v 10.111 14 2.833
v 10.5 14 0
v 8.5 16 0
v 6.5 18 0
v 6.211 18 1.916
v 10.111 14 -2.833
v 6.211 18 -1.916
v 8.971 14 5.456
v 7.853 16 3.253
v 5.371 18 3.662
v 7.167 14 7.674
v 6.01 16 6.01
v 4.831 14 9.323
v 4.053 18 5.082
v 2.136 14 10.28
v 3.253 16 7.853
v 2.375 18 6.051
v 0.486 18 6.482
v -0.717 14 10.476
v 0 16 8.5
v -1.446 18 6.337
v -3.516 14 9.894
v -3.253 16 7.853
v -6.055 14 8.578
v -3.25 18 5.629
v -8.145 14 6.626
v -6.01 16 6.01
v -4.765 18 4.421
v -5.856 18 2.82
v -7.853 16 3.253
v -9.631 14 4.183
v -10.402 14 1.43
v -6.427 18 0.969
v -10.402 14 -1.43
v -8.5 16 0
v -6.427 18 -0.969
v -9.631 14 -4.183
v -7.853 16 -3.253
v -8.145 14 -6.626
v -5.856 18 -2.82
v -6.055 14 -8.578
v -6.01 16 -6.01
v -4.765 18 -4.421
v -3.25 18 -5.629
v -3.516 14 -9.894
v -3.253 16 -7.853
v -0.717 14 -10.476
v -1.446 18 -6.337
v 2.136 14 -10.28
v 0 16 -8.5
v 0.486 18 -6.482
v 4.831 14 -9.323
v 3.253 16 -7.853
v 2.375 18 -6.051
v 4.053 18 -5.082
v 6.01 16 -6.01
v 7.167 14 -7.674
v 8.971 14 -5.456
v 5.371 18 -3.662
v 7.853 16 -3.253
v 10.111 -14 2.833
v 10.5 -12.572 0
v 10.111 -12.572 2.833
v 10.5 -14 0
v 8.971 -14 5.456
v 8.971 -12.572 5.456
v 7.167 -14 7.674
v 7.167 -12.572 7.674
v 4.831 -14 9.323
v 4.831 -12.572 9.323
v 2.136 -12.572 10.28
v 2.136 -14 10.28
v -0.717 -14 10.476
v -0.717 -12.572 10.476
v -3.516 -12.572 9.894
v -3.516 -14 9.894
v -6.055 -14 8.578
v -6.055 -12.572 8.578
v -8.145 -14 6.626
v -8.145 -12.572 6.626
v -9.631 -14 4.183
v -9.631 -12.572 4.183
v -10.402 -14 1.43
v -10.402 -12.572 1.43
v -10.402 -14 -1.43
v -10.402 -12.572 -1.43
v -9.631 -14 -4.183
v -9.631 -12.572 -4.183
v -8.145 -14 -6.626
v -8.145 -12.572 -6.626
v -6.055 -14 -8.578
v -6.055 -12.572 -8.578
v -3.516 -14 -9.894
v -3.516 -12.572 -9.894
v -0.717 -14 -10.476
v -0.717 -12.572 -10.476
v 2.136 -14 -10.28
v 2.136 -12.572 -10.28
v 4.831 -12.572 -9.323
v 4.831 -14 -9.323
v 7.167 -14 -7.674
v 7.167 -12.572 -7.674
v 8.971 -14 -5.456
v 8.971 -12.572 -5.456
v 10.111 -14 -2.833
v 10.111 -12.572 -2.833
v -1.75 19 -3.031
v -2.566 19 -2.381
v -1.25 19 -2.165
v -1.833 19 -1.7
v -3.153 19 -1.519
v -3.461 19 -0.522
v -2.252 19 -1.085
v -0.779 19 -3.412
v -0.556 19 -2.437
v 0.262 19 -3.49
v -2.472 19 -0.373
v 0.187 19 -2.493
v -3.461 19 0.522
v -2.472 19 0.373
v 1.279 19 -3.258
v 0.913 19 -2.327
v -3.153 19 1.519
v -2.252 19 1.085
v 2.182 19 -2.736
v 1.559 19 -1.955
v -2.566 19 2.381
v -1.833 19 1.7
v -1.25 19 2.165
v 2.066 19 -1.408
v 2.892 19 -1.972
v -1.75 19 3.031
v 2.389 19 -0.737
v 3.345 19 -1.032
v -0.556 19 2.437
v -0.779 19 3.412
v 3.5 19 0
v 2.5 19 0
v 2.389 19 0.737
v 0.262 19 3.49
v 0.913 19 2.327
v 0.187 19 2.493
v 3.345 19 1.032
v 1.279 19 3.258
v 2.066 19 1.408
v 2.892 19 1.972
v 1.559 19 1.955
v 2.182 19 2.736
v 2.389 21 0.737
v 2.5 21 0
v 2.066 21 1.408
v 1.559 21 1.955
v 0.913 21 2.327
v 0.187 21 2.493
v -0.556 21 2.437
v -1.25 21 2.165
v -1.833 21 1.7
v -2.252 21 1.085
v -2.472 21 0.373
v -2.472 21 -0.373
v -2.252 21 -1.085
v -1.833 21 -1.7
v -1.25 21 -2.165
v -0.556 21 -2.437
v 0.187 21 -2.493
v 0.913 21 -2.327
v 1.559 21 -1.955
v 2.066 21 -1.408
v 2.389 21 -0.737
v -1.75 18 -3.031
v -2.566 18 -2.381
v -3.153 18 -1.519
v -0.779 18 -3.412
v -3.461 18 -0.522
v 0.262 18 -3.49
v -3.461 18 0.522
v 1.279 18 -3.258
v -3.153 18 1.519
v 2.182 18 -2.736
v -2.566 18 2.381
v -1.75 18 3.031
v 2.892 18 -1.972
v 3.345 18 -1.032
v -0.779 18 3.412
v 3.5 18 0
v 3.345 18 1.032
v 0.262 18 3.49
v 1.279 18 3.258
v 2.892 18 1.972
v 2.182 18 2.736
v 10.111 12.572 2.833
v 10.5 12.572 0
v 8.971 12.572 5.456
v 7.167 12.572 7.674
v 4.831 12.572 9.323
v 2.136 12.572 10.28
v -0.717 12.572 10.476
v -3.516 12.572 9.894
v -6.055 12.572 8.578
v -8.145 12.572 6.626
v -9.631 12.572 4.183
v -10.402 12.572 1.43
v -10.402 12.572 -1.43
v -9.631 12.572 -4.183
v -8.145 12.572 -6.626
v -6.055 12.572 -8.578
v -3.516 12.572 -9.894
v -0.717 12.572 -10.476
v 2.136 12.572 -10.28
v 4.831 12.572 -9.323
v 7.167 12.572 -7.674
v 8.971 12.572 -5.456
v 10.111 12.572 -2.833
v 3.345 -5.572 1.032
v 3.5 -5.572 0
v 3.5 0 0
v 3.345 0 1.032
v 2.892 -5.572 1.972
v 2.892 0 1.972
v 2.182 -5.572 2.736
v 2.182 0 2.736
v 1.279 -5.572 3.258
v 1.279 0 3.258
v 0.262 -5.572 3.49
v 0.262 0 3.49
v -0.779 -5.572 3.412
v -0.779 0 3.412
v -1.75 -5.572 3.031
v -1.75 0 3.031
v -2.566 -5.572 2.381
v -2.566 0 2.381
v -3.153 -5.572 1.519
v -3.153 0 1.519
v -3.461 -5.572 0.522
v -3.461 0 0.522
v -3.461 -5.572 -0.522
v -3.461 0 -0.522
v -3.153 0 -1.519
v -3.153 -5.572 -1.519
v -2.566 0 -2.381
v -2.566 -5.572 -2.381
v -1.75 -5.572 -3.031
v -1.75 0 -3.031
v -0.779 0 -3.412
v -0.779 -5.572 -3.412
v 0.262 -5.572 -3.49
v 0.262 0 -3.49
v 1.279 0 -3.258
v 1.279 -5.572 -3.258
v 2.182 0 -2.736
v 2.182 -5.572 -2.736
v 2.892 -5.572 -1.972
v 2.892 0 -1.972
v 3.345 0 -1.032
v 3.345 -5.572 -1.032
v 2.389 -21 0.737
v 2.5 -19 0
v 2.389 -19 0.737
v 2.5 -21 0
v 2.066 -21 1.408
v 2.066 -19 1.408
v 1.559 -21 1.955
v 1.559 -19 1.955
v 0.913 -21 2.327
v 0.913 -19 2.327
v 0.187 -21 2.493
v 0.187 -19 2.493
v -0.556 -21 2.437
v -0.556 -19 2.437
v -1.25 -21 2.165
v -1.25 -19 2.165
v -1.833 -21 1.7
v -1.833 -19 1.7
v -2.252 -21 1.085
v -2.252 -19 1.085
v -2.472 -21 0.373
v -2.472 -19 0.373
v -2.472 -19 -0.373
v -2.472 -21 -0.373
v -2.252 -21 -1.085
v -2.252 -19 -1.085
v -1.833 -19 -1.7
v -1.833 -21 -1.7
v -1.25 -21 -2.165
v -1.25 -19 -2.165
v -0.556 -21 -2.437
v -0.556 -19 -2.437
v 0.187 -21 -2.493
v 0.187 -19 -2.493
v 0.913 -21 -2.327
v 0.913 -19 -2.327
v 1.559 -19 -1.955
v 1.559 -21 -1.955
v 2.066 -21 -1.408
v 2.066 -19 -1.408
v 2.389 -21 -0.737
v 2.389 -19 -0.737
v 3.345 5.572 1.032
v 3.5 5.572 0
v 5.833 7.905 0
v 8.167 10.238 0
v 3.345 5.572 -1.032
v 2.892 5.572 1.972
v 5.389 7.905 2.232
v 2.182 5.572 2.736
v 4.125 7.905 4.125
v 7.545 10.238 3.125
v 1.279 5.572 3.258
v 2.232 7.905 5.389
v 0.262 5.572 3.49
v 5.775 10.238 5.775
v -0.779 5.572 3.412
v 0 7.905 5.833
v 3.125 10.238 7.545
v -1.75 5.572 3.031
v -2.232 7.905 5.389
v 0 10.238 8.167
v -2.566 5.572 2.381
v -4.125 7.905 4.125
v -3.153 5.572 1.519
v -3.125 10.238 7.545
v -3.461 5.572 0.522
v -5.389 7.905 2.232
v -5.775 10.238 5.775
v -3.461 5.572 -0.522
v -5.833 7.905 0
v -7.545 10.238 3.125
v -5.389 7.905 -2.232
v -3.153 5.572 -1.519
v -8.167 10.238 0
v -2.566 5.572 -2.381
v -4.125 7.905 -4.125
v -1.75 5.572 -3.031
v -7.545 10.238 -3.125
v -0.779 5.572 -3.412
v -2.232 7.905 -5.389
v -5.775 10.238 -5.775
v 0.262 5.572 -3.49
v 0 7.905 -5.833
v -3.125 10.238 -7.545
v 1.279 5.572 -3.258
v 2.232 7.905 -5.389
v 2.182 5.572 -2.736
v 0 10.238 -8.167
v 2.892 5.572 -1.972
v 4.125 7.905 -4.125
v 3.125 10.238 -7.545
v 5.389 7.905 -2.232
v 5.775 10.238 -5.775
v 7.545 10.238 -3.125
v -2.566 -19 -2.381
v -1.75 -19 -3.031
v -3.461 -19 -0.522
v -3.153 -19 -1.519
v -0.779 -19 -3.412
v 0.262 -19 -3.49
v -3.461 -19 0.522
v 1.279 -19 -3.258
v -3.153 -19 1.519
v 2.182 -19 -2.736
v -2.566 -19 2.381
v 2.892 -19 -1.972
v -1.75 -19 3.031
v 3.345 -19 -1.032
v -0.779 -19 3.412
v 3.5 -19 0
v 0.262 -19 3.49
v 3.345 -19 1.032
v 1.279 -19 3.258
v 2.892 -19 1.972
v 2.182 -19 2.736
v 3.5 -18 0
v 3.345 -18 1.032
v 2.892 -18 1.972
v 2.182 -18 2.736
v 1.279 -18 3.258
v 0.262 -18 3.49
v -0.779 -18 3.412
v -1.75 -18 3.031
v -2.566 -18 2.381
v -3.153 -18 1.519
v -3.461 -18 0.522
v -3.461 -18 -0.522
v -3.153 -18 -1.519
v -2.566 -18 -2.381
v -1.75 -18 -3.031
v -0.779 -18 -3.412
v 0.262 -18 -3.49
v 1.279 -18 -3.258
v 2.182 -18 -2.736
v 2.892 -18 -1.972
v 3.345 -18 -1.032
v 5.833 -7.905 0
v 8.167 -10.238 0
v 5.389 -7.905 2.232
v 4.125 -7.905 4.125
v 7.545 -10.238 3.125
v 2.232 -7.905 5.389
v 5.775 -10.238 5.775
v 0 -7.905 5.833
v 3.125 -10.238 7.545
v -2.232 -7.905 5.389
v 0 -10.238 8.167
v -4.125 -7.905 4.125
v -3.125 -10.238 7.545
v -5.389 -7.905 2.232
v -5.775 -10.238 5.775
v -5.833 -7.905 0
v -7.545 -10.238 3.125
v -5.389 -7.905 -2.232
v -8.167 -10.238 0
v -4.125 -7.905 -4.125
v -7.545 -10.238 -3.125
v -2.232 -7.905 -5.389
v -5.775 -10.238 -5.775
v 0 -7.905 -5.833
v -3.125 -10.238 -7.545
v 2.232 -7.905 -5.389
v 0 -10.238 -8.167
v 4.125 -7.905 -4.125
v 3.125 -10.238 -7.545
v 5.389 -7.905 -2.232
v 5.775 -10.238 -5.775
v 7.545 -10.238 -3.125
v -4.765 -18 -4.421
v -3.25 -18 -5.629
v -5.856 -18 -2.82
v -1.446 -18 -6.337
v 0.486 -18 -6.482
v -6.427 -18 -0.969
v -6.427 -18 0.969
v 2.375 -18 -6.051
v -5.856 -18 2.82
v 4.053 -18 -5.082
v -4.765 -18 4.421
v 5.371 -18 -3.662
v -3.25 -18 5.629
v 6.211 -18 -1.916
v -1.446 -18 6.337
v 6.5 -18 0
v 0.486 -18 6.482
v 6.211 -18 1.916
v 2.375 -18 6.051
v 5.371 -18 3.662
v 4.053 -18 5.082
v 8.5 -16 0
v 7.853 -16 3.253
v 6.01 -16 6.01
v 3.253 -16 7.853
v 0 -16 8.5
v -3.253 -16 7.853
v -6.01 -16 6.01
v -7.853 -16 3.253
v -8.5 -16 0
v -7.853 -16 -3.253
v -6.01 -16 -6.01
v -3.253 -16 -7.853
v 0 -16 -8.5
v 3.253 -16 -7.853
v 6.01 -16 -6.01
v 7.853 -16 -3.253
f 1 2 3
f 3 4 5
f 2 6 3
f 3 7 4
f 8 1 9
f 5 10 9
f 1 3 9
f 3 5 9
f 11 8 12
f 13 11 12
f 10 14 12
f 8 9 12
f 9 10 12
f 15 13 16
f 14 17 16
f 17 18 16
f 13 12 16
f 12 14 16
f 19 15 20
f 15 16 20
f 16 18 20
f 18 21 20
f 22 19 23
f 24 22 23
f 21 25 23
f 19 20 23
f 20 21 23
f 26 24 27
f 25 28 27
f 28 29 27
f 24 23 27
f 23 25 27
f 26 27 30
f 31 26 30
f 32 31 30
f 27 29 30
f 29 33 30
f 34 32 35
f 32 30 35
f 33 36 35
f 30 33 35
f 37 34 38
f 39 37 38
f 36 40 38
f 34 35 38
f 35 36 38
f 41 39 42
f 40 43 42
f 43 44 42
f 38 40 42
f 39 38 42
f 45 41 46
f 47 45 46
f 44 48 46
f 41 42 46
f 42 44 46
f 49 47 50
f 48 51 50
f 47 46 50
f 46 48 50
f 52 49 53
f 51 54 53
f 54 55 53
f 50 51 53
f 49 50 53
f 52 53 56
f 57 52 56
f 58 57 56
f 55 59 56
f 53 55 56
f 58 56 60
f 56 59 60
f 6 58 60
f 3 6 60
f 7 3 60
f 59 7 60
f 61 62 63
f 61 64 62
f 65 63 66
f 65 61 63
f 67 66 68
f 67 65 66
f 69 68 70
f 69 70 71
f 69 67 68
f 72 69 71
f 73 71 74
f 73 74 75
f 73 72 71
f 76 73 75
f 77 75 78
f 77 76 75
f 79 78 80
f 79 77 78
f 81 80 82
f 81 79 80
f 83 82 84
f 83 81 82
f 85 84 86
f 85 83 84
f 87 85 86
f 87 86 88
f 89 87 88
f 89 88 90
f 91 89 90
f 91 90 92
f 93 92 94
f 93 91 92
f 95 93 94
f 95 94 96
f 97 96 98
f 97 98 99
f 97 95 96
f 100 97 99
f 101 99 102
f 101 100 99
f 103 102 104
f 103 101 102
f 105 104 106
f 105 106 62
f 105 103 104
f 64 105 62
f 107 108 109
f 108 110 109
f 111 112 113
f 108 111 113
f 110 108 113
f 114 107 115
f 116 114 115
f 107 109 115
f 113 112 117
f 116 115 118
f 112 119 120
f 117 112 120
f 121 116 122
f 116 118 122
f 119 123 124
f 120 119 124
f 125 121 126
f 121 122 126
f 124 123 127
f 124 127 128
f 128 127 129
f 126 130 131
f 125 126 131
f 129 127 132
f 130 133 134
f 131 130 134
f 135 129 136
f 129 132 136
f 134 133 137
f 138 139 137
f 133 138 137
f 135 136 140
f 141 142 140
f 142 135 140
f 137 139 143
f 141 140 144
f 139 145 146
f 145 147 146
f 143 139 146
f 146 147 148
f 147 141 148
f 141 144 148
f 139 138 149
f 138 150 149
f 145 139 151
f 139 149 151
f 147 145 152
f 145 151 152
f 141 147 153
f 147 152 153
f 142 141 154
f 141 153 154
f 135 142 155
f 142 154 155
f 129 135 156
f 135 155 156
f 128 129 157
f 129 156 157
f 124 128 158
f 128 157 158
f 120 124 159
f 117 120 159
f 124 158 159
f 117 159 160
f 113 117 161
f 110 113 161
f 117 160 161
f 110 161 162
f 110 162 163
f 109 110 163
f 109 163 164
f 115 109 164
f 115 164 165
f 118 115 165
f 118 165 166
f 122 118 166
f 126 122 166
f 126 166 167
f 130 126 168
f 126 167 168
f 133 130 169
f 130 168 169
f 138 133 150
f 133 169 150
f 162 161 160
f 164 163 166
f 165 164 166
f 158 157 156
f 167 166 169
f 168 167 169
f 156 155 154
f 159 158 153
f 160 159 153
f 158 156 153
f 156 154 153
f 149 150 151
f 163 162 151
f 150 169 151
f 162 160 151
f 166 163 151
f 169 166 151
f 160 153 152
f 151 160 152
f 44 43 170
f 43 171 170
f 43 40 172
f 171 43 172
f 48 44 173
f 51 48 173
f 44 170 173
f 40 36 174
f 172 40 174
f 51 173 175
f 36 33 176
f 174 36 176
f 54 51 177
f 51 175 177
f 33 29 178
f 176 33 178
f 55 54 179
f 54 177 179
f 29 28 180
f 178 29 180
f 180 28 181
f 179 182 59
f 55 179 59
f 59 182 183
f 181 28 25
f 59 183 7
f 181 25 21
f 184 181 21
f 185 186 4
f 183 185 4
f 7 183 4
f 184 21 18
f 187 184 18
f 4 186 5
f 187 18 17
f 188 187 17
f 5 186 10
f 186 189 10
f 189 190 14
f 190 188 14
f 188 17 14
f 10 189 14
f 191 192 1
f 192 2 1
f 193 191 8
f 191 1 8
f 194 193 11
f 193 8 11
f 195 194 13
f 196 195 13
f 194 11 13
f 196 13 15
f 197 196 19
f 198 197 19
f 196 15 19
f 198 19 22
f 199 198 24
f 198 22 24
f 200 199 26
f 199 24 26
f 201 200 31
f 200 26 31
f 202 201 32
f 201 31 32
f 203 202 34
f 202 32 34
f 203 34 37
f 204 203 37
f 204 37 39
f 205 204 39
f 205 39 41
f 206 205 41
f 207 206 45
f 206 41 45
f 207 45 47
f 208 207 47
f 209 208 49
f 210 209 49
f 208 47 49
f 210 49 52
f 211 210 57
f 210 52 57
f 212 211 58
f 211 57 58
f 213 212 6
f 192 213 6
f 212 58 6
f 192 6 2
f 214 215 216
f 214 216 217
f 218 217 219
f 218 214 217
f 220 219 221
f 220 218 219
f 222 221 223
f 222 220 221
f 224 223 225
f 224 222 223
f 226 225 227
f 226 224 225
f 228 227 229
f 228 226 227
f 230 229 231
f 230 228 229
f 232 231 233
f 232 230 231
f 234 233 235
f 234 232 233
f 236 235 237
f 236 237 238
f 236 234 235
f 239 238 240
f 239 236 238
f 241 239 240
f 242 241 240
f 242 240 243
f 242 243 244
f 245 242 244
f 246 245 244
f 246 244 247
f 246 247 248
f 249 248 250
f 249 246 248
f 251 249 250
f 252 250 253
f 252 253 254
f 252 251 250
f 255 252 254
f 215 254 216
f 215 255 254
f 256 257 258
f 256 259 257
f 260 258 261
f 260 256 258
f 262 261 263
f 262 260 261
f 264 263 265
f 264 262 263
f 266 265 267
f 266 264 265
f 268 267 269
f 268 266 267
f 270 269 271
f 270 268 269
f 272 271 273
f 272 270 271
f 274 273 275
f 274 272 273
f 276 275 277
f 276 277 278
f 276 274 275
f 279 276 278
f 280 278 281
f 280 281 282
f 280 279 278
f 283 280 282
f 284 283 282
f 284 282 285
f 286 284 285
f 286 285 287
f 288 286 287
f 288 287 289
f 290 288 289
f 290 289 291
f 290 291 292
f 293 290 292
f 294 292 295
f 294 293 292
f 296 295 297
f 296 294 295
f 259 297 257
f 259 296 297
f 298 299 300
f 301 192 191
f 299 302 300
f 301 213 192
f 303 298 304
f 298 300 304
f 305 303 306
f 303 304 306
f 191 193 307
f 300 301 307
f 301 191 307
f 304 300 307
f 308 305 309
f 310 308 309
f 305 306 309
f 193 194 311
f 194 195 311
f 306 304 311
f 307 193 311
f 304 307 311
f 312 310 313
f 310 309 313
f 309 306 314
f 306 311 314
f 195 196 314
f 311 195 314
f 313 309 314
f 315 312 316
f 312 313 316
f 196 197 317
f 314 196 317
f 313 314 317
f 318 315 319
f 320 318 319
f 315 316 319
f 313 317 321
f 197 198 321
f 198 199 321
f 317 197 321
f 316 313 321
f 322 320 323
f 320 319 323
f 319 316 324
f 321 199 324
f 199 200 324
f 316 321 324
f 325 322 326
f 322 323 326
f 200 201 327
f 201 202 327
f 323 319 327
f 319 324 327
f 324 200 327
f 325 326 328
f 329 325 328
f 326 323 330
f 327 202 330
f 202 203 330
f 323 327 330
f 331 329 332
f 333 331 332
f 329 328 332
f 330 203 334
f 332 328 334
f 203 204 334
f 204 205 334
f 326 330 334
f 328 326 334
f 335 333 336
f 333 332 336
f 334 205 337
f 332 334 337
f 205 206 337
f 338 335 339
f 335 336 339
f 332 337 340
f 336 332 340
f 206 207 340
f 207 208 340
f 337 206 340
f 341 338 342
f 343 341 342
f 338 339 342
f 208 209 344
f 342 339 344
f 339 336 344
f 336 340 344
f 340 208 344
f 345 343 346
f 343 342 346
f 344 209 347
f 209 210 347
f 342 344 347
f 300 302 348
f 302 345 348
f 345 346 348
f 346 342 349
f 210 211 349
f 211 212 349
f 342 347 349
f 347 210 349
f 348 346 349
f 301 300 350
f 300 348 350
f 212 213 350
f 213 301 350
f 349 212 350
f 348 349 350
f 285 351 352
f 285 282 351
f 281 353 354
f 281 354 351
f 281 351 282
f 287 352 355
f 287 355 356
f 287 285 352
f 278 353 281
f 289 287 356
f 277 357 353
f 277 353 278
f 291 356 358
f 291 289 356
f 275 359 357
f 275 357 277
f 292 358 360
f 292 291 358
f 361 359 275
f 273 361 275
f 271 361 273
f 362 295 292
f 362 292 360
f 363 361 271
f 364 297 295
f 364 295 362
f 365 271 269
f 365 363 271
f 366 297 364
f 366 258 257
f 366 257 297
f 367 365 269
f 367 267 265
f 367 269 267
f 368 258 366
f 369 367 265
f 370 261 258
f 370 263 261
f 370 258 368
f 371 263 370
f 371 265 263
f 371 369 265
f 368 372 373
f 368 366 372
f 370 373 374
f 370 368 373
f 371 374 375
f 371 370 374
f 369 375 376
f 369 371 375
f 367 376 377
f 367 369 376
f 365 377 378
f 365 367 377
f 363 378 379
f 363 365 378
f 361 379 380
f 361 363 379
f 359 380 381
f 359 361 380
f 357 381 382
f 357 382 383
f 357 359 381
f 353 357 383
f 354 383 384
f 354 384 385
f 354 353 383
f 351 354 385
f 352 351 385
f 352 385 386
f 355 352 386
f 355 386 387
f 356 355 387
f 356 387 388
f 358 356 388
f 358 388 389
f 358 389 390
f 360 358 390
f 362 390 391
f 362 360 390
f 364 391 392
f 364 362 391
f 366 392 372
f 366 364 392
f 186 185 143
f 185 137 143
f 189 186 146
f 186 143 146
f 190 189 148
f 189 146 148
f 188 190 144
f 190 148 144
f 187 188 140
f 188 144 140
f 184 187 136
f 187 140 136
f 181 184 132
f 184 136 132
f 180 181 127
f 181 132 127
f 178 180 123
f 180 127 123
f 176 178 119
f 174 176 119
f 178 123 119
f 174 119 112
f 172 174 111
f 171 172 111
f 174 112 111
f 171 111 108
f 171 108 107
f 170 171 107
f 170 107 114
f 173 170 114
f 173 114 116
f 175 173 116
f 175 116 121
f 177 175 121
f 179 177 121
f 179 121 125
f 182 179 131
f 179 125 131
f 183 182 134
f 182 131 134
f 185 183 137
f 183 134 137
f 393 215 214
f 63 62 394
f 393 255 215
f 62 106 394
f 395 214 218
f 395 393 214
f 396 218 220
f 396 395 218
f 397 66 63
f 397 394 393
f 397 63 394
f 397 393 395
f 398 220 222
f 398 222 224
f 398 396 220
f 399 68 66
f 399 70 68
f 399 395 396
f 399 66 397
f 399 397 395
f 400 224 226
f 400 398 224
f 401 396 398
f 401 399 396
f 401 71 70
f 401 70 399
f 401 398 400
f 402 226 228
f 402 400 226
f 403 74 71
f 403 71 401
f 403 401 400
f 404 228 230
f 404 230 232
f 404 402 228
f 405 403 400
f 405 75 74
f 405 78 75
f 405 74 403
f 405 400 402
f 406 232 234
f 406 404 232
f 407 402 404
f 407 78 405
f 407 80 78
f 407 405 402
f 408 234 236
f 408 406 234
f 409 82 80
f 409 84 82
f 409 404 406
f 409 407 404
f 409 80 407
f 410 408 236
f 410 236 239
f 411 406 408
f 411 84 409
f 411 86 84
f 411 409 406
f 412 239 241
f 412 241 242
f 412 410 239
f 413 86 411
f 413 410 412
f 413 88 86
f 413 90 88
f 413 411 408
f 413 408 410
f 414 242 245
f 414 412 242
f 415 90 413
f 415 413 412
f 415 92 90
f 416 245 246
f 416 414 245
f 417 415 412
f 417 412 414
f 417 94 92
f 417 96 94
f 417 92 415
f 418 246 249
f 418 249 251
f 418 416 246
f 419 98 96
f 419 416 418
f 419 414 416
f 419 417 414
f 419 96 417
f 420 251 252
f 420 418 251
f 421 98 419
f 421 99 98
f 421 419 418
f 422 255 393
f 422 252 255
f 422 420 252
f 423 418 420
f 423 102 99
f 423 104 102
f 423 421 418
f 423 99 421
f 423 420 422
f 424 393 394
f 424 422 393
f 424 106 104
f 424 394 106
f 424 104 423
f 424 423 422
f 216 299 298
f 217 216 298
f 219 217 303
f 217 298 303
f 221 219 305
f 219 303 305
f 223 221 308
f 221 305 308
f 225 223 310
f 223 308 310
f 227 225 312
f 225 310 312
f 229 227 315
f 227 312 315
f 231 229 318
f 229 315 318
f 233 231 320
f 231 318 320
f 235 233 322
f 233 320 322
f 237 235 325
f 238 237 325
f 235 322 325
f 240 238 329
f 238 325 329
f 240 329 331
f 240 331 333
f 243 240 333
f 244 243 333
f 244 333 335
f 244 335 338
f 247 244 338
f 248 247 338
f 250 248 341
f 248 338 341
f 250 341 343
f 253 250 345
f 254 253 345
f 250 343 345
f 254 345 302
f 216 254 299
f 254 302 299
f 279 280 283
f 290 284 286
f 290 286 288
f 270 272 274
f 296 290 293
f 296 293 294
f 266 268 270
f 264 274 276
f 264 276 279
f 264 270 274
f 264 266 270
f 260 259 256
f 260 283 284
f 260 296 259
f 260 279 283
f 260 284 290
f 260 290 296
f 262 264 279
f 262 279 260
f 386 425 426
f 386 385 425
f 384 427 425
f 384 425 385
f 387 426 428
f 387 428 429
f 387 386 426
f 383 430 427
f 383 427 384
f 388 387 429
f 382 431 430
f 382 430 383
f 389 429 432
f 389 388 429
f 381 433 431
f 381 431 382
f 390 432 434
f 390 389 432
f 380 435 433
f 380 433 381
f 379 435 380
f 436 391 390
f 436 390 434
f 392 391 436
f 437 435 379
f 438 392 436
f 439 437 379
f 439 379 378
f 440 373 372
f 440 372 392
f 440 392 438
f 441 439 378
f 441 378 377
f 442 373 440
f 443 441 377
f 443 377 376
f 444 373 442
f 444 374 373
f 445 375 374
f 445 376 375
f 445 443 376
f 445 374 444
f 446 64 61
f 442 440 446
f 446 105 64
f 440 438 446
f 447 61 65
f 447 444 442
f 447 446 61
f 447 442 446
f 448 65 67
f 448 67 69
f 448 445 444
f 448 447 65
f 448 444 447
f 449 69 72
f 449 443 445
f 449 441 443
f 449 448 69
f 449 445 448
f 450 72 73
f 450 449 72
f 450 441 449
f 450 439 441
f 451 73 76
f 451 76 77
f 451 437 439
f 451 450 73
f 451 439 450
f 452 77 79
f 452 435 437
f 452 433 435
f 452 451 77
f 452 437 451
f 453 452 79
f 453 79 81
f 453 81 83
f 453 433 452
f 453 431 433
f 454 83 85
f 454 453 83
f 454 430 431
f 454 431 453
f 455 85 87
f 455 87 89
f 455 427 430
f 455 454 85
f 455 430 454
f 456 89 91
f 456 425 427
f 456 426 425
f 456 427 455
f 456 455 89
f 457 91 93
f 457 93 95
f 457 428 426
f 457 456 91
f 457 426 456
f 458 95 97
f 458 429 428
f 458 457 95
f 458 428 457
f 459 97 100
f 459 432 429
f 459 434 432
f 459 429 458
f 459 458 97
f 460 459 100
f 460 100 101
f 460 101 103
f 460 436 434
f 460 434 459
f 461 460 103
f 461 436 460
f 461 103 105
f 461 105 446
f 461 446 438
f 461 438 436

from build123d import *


with BuildPart() as part:
    # Sketch1 → Revolve1 (revolve)
    with BuildSketch(Plane.XY):
        Polygon((0, 21), (0, 0), (3.5, 0), (3.5, 5.571782079), (10.5, 12.571782079), (10.5, 14), (6.5, 18), (3.5, 18), (3.5, 19), (2.5, 19), (2.5, 21), align=None)
    revolve1 = revolve(axis=Axis((0, 21, 0), (0, -1, 0)))

    # Mirror1: Revolve1 across plane
    add(revolve1.mirror(Plane.ZX))


solid = part.part
